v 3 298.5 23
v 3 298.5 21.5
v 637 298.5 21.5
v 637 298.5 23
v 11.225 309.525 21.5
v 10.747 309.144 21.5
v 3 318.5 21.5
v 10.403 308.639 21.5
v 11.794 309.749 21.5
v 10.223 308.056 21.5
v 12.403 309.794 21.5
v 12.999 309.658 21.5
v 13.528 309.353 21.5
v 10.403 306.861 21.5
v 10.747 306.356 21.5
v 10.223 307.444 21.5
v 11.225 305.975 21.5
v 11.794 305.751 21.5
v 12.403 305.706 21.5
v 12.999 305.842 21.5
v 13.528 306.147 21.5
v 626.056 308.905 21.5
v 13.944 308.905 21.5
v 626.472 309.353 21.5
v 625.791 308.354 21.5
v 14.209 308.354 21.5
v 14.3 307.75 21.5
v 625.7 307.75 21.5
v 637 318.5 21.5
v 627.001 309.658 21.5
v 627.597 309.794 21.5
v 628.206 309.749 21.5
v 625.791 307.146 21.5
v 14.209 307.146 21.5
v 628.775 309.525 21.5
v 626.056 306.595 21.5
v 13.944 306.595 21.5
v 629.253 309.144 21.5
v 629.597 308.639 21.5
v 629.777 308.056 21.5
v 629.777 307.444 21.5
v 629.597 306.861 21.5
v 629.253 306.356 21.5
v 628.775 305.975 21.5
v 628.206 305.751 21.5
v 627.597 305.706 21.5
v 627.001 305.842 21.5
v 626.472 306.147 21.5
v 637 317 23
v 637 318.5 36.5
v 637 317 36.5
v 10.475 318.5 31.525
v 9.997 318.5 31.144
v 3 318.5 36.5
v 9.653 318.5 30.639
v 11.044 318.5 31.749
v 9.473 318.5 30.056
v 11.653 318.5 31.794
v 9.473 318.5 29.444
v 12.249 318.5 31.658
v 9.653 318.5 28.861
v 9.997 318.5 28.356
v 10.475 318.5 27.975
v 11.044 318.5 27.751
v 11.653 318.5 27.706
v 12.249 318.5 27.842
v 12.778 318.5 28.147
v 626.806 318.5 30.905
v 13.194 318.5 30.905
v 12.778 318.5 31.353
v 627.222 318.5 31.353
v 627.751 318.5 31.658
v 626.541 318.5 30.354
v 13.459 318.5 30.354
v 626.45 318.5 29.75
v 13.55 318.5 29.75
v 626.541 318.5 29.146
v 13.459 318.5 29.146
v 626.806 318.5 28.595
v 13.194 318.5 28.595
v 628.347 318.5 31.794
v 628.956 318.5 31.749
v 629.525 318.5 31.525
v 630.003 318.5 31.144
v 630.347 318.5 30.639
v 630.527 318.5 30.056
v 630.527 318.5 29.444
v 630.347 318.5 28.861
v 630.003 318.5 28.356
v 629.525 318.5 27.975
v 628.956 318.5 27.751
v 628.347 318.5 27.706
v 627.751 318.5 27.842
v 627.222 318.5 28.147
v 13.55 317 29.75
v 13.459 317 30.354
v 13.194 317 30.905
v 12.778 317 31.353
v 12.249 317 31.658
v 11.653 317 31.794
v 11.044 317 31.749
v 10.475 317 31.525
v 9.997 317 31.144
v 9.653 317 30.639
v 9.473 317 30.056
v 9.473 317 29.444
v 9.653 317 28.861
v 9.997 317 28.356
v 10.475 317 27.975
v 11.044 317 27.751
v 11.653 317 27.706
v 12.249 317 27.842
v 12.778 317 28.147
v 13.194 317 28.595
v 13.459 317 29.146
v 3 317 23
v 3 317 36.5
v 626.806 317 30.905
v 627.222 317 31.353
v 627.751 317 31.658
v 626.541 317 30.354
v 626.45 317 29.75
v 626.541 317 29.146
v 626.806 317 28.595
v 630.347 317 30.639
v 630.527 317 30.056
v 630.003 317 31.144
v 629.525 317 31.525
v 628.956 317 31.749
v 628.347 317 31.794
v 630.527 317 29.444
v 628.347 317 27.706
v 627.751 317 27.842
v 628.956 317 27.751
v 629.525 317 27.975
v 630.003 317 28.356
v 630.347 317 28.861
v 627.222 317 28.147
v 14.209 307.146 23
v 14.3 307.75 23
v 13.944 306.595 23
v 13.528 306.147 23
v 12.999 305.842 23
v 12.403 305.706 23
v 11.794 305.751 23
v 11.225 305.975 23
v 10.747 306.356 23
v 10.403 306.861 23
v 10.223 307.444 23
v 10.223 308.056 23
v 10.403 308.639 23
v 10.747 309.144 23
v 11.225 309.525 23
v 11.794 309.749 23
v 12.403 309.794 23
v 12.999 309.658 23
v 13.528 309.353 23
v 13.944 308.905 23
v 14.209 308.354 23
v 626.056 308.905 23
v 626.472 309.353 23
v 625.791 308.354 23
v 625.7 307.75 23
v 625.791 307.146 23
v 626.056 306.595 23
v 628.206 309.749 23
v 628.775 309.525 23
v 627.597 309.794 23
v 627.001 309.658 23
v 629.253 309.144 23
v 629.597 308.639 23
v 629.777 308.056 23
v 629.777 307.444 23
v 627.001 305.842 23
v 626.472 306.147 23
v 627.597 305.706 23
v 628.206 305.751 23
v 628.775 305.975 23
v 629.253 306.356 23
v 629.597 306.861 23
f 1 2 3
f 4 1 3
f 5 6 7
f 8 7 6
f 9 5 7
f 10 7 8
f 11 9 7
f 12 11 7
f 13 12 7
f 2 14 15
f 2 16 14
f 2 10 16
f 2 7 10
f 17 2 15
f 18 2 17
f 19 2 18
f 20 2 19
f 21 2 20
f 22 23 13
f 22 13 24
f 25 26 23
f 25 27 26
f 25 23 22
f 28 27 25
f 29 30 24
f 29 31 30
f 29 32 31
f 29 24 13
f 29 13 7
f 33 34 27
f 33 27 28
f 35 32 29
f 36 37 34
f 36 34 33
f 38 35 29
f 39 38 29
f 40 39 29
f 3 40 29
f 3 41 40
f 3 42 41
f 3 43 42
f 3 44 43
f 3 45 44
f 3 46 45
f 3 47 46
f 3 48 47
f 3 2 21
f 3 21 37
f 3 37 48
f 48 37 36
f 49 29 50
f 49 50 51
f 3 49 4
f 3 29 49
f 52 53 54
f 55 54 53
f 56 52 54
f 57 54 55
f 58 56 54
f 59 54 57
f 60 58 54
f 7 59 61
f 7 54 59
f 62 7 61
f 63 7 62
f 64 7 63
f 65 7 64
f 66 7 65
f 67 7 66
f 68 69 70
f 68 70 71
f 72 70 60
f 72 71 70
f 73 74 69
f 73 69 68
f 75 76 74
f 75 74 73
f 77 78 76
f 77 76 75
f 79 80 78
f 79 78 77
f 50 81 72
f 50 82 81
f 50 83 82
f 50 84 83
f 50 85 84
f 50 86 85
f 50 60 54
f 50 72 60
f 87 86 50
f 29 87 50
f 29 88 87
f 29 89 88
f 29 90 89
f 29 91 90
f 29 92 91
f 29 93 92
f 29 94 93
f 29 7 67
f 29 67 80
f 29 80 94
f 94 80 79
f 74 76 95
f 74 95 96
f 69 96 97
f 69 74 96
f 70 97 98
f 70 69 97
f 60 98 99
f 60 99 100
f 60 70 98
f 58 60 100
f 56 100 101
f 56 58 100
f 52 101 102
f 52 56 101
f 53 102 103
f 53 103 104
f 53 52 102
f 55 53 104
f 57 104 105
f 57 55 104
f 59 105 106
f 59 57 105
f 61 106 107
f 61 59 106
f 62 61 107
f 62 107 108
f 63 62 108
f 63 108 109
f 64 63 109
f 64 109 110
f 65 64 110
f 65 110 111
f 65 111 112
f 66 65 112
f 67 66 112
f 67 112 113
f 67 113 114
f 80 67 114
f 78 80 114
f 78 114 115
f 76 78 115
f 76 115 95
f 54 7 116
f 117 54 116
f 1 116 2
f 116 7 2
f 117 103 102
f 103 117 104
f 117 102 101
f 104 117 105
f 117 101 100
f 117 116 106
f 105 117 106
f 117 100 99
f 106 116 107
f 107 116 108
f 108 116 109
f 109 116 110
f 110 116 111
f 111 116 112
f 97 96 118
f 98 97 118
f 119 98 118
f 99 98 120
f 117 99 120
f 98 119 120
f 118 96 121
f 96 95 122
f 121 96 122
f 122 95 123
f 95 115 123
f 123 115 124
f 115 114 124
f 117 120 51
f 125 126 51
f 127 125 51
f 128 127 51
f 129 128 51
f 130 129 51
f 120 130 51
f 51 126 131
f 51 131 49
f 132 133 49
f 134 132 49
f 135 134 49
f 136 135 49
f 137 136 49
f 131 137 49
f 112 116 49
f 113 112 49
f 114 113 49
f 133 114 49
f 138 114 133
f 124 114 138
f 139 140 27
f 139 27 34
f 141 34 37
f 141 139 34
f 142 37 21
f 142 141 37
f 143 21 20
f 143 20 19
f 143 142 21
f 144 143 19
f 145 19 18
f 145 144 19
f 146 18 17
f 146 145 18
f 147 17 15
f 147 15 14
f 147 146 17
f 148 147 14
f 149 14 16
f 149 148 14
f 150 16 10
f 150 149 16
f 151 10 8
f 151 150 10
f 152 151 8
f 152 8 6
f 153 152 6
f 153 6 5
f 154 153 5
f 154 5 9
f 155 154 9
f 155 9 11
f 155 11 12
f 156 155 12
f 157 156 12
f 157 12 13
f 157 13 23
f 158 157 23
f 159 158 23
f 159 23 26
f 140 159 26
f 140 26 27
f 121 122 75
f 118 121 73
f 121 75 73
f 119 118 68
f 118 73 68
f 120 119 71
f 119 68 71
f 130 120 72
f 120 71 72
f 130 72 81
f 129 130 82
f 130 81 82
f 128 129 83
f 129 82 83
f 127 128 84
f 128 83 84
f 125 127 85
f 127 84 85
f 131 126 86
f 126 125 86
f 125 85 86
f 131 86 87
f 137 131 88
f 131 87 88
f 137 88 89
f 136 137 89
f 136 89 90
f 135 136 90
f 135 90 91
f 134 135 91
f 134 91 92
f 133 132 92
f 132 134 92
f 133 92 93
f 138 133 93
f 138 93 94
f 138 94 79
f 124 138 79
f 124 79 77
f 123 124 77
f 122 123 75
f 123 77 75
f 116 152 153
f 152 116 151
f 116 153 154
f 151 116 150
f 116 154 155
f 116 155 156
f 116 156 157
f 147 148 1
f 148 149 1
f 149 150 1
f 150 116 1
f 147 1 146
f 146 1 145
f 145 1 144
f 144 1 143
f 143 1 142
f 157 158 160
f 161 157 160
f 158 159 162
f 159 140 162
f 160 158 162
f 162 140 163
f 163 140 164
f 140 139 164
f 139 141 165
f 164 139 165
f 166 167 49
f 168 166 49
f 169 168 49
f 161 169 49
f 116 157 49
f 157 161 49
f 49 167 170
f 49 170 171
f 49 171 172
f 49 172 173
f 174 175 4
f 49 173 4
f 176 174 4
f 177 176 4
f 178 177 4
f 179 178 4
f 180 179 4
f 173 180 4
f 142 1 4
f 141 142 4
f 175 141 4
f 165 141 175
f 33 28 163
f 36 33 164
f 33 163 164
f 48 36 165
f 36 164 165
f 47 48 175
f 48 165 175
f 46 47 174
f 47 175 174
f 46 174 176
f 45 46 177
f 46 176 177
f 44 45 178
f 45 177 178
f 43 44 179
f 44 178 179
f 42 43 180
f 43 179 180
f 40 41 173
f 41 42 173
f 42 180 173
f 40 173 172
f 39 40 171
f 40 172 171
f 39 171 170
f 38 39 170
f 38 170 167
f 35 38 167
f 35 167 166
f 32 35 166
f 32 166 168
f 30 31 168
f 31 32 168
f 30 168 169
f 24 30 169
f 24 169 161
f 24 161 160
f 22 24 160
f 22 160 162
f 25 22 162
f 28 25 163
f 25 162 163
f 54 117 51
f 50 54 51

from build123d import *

# Parameters (mm, degrees)
BOX011_W      = 634
BOX011_H      = 20
BOX011_DEPTH  = 15
BOX010_W      = 634
BOX010_H      = 20
BOX010_DEPTH  = 15
SKETCH009_R   = 2.05
HOLE004_DEPTH = 1270.486422
SKETCH018_R   = 2.05
HOLE011_DEPTH = 1288.986422


with BuildPart() as reference_cube_cut:
    # Box011 → Box011 (new body)
    with BuildSketch(Plane(origin=(1.5, 1.5, 1.5), x_dir=(1, 0, 0), z_dir=(0, 0, 1))):
        with Locations((317, 10)):
            Rectangle(BOX011_W, BOX011_H)
    extrude(amount=BOX011_DEPTH)


with BuildPart() as bottom_body:
    # Box010 → Box010 (new body)
    with BuildSketch(Plane(origin=(1.5, 0, 0), x_dir=(1, 0, 0), z_dir=(0, 0, 1))):
        with Locations((317, 10)):
            Rectangle(BOX010_W, BOX010_H)
    extrude(amount=BOX010_DEPTH)

    # Cut005: cut reference_cube_cut
    add(reference_cube_cut.part, mode=Mode.SUBTRACT)


with BuildPart() as bottom_body_1:
    # Cut005 placement: moved
    add(bottom_body.part.moved(Location((1.5, 1.5, 23))))


with BuildPart() as bottom_body_2:
    # BaseFeature003 placement: moved
    add(bottom_body_1.part.moved(Location((-1.5, -1.5, -23))))

    # Sketch009 → Hole004 (cut, through all)
    with BuildSketch(Plane.XY.offset(1.5)):
        with Locations((10.75, 10.75)):
            Circle(SKETCH009_R)
    hole004 = extrude(amount=-HOLE004_DEPTH, mode=Mode.SUBTRACT)

    # Mirrored002: Hole004 across Sketch009 Axis0
    add(hole004.mirror(Plane(origin=(318.5, 20, 1.5), x_dir=(0, 0, 1), z_dir=(1, 0, 0))), mode=Mode.SUBTRACT)

    # Sketch018 → Hole011 (cut, through all)
    with BuildSketch(Plane.XZ):
        with Locations((10, 8.25)):
            Circle(SKETCH018_R)
    hole011 = extrude(amount=-HOLE011_DEPTH, mode=Mode.SUBTRACT)

    # Mirrored006: Hole011 across Sketch018 Axis0
    add(hole011.mirror(Plane(origin=(318.5, 0, 15), x_dir=(0, -1, 0), z_dir=(1, 0, 0))), mode=Mode.SUBTRACT)


with BuildPart() as bottom_body_3:
    # Body003 placement: moved
    add(bottom_body_2.part.moved(Location((1.5, 1.5, 21.5))))


with BuildPart() as front_bottom_mirror:
    # Part__Mirroring004: instance of bottom_body
    add(bottom_body_3.part.mirror(Plane(origin=(490, 4e-06, 29), x_dir=(1, 0, 0), z_dir=(0, 1, 0))))


with BuildPart() as front_bottom_mirror_1:
    # Part__Mirroring004 placement: moved
    add(front_bottom_mirror.part.moved(Location((0, 320, 0))))


solid = front_bottom_mirror_1.part
